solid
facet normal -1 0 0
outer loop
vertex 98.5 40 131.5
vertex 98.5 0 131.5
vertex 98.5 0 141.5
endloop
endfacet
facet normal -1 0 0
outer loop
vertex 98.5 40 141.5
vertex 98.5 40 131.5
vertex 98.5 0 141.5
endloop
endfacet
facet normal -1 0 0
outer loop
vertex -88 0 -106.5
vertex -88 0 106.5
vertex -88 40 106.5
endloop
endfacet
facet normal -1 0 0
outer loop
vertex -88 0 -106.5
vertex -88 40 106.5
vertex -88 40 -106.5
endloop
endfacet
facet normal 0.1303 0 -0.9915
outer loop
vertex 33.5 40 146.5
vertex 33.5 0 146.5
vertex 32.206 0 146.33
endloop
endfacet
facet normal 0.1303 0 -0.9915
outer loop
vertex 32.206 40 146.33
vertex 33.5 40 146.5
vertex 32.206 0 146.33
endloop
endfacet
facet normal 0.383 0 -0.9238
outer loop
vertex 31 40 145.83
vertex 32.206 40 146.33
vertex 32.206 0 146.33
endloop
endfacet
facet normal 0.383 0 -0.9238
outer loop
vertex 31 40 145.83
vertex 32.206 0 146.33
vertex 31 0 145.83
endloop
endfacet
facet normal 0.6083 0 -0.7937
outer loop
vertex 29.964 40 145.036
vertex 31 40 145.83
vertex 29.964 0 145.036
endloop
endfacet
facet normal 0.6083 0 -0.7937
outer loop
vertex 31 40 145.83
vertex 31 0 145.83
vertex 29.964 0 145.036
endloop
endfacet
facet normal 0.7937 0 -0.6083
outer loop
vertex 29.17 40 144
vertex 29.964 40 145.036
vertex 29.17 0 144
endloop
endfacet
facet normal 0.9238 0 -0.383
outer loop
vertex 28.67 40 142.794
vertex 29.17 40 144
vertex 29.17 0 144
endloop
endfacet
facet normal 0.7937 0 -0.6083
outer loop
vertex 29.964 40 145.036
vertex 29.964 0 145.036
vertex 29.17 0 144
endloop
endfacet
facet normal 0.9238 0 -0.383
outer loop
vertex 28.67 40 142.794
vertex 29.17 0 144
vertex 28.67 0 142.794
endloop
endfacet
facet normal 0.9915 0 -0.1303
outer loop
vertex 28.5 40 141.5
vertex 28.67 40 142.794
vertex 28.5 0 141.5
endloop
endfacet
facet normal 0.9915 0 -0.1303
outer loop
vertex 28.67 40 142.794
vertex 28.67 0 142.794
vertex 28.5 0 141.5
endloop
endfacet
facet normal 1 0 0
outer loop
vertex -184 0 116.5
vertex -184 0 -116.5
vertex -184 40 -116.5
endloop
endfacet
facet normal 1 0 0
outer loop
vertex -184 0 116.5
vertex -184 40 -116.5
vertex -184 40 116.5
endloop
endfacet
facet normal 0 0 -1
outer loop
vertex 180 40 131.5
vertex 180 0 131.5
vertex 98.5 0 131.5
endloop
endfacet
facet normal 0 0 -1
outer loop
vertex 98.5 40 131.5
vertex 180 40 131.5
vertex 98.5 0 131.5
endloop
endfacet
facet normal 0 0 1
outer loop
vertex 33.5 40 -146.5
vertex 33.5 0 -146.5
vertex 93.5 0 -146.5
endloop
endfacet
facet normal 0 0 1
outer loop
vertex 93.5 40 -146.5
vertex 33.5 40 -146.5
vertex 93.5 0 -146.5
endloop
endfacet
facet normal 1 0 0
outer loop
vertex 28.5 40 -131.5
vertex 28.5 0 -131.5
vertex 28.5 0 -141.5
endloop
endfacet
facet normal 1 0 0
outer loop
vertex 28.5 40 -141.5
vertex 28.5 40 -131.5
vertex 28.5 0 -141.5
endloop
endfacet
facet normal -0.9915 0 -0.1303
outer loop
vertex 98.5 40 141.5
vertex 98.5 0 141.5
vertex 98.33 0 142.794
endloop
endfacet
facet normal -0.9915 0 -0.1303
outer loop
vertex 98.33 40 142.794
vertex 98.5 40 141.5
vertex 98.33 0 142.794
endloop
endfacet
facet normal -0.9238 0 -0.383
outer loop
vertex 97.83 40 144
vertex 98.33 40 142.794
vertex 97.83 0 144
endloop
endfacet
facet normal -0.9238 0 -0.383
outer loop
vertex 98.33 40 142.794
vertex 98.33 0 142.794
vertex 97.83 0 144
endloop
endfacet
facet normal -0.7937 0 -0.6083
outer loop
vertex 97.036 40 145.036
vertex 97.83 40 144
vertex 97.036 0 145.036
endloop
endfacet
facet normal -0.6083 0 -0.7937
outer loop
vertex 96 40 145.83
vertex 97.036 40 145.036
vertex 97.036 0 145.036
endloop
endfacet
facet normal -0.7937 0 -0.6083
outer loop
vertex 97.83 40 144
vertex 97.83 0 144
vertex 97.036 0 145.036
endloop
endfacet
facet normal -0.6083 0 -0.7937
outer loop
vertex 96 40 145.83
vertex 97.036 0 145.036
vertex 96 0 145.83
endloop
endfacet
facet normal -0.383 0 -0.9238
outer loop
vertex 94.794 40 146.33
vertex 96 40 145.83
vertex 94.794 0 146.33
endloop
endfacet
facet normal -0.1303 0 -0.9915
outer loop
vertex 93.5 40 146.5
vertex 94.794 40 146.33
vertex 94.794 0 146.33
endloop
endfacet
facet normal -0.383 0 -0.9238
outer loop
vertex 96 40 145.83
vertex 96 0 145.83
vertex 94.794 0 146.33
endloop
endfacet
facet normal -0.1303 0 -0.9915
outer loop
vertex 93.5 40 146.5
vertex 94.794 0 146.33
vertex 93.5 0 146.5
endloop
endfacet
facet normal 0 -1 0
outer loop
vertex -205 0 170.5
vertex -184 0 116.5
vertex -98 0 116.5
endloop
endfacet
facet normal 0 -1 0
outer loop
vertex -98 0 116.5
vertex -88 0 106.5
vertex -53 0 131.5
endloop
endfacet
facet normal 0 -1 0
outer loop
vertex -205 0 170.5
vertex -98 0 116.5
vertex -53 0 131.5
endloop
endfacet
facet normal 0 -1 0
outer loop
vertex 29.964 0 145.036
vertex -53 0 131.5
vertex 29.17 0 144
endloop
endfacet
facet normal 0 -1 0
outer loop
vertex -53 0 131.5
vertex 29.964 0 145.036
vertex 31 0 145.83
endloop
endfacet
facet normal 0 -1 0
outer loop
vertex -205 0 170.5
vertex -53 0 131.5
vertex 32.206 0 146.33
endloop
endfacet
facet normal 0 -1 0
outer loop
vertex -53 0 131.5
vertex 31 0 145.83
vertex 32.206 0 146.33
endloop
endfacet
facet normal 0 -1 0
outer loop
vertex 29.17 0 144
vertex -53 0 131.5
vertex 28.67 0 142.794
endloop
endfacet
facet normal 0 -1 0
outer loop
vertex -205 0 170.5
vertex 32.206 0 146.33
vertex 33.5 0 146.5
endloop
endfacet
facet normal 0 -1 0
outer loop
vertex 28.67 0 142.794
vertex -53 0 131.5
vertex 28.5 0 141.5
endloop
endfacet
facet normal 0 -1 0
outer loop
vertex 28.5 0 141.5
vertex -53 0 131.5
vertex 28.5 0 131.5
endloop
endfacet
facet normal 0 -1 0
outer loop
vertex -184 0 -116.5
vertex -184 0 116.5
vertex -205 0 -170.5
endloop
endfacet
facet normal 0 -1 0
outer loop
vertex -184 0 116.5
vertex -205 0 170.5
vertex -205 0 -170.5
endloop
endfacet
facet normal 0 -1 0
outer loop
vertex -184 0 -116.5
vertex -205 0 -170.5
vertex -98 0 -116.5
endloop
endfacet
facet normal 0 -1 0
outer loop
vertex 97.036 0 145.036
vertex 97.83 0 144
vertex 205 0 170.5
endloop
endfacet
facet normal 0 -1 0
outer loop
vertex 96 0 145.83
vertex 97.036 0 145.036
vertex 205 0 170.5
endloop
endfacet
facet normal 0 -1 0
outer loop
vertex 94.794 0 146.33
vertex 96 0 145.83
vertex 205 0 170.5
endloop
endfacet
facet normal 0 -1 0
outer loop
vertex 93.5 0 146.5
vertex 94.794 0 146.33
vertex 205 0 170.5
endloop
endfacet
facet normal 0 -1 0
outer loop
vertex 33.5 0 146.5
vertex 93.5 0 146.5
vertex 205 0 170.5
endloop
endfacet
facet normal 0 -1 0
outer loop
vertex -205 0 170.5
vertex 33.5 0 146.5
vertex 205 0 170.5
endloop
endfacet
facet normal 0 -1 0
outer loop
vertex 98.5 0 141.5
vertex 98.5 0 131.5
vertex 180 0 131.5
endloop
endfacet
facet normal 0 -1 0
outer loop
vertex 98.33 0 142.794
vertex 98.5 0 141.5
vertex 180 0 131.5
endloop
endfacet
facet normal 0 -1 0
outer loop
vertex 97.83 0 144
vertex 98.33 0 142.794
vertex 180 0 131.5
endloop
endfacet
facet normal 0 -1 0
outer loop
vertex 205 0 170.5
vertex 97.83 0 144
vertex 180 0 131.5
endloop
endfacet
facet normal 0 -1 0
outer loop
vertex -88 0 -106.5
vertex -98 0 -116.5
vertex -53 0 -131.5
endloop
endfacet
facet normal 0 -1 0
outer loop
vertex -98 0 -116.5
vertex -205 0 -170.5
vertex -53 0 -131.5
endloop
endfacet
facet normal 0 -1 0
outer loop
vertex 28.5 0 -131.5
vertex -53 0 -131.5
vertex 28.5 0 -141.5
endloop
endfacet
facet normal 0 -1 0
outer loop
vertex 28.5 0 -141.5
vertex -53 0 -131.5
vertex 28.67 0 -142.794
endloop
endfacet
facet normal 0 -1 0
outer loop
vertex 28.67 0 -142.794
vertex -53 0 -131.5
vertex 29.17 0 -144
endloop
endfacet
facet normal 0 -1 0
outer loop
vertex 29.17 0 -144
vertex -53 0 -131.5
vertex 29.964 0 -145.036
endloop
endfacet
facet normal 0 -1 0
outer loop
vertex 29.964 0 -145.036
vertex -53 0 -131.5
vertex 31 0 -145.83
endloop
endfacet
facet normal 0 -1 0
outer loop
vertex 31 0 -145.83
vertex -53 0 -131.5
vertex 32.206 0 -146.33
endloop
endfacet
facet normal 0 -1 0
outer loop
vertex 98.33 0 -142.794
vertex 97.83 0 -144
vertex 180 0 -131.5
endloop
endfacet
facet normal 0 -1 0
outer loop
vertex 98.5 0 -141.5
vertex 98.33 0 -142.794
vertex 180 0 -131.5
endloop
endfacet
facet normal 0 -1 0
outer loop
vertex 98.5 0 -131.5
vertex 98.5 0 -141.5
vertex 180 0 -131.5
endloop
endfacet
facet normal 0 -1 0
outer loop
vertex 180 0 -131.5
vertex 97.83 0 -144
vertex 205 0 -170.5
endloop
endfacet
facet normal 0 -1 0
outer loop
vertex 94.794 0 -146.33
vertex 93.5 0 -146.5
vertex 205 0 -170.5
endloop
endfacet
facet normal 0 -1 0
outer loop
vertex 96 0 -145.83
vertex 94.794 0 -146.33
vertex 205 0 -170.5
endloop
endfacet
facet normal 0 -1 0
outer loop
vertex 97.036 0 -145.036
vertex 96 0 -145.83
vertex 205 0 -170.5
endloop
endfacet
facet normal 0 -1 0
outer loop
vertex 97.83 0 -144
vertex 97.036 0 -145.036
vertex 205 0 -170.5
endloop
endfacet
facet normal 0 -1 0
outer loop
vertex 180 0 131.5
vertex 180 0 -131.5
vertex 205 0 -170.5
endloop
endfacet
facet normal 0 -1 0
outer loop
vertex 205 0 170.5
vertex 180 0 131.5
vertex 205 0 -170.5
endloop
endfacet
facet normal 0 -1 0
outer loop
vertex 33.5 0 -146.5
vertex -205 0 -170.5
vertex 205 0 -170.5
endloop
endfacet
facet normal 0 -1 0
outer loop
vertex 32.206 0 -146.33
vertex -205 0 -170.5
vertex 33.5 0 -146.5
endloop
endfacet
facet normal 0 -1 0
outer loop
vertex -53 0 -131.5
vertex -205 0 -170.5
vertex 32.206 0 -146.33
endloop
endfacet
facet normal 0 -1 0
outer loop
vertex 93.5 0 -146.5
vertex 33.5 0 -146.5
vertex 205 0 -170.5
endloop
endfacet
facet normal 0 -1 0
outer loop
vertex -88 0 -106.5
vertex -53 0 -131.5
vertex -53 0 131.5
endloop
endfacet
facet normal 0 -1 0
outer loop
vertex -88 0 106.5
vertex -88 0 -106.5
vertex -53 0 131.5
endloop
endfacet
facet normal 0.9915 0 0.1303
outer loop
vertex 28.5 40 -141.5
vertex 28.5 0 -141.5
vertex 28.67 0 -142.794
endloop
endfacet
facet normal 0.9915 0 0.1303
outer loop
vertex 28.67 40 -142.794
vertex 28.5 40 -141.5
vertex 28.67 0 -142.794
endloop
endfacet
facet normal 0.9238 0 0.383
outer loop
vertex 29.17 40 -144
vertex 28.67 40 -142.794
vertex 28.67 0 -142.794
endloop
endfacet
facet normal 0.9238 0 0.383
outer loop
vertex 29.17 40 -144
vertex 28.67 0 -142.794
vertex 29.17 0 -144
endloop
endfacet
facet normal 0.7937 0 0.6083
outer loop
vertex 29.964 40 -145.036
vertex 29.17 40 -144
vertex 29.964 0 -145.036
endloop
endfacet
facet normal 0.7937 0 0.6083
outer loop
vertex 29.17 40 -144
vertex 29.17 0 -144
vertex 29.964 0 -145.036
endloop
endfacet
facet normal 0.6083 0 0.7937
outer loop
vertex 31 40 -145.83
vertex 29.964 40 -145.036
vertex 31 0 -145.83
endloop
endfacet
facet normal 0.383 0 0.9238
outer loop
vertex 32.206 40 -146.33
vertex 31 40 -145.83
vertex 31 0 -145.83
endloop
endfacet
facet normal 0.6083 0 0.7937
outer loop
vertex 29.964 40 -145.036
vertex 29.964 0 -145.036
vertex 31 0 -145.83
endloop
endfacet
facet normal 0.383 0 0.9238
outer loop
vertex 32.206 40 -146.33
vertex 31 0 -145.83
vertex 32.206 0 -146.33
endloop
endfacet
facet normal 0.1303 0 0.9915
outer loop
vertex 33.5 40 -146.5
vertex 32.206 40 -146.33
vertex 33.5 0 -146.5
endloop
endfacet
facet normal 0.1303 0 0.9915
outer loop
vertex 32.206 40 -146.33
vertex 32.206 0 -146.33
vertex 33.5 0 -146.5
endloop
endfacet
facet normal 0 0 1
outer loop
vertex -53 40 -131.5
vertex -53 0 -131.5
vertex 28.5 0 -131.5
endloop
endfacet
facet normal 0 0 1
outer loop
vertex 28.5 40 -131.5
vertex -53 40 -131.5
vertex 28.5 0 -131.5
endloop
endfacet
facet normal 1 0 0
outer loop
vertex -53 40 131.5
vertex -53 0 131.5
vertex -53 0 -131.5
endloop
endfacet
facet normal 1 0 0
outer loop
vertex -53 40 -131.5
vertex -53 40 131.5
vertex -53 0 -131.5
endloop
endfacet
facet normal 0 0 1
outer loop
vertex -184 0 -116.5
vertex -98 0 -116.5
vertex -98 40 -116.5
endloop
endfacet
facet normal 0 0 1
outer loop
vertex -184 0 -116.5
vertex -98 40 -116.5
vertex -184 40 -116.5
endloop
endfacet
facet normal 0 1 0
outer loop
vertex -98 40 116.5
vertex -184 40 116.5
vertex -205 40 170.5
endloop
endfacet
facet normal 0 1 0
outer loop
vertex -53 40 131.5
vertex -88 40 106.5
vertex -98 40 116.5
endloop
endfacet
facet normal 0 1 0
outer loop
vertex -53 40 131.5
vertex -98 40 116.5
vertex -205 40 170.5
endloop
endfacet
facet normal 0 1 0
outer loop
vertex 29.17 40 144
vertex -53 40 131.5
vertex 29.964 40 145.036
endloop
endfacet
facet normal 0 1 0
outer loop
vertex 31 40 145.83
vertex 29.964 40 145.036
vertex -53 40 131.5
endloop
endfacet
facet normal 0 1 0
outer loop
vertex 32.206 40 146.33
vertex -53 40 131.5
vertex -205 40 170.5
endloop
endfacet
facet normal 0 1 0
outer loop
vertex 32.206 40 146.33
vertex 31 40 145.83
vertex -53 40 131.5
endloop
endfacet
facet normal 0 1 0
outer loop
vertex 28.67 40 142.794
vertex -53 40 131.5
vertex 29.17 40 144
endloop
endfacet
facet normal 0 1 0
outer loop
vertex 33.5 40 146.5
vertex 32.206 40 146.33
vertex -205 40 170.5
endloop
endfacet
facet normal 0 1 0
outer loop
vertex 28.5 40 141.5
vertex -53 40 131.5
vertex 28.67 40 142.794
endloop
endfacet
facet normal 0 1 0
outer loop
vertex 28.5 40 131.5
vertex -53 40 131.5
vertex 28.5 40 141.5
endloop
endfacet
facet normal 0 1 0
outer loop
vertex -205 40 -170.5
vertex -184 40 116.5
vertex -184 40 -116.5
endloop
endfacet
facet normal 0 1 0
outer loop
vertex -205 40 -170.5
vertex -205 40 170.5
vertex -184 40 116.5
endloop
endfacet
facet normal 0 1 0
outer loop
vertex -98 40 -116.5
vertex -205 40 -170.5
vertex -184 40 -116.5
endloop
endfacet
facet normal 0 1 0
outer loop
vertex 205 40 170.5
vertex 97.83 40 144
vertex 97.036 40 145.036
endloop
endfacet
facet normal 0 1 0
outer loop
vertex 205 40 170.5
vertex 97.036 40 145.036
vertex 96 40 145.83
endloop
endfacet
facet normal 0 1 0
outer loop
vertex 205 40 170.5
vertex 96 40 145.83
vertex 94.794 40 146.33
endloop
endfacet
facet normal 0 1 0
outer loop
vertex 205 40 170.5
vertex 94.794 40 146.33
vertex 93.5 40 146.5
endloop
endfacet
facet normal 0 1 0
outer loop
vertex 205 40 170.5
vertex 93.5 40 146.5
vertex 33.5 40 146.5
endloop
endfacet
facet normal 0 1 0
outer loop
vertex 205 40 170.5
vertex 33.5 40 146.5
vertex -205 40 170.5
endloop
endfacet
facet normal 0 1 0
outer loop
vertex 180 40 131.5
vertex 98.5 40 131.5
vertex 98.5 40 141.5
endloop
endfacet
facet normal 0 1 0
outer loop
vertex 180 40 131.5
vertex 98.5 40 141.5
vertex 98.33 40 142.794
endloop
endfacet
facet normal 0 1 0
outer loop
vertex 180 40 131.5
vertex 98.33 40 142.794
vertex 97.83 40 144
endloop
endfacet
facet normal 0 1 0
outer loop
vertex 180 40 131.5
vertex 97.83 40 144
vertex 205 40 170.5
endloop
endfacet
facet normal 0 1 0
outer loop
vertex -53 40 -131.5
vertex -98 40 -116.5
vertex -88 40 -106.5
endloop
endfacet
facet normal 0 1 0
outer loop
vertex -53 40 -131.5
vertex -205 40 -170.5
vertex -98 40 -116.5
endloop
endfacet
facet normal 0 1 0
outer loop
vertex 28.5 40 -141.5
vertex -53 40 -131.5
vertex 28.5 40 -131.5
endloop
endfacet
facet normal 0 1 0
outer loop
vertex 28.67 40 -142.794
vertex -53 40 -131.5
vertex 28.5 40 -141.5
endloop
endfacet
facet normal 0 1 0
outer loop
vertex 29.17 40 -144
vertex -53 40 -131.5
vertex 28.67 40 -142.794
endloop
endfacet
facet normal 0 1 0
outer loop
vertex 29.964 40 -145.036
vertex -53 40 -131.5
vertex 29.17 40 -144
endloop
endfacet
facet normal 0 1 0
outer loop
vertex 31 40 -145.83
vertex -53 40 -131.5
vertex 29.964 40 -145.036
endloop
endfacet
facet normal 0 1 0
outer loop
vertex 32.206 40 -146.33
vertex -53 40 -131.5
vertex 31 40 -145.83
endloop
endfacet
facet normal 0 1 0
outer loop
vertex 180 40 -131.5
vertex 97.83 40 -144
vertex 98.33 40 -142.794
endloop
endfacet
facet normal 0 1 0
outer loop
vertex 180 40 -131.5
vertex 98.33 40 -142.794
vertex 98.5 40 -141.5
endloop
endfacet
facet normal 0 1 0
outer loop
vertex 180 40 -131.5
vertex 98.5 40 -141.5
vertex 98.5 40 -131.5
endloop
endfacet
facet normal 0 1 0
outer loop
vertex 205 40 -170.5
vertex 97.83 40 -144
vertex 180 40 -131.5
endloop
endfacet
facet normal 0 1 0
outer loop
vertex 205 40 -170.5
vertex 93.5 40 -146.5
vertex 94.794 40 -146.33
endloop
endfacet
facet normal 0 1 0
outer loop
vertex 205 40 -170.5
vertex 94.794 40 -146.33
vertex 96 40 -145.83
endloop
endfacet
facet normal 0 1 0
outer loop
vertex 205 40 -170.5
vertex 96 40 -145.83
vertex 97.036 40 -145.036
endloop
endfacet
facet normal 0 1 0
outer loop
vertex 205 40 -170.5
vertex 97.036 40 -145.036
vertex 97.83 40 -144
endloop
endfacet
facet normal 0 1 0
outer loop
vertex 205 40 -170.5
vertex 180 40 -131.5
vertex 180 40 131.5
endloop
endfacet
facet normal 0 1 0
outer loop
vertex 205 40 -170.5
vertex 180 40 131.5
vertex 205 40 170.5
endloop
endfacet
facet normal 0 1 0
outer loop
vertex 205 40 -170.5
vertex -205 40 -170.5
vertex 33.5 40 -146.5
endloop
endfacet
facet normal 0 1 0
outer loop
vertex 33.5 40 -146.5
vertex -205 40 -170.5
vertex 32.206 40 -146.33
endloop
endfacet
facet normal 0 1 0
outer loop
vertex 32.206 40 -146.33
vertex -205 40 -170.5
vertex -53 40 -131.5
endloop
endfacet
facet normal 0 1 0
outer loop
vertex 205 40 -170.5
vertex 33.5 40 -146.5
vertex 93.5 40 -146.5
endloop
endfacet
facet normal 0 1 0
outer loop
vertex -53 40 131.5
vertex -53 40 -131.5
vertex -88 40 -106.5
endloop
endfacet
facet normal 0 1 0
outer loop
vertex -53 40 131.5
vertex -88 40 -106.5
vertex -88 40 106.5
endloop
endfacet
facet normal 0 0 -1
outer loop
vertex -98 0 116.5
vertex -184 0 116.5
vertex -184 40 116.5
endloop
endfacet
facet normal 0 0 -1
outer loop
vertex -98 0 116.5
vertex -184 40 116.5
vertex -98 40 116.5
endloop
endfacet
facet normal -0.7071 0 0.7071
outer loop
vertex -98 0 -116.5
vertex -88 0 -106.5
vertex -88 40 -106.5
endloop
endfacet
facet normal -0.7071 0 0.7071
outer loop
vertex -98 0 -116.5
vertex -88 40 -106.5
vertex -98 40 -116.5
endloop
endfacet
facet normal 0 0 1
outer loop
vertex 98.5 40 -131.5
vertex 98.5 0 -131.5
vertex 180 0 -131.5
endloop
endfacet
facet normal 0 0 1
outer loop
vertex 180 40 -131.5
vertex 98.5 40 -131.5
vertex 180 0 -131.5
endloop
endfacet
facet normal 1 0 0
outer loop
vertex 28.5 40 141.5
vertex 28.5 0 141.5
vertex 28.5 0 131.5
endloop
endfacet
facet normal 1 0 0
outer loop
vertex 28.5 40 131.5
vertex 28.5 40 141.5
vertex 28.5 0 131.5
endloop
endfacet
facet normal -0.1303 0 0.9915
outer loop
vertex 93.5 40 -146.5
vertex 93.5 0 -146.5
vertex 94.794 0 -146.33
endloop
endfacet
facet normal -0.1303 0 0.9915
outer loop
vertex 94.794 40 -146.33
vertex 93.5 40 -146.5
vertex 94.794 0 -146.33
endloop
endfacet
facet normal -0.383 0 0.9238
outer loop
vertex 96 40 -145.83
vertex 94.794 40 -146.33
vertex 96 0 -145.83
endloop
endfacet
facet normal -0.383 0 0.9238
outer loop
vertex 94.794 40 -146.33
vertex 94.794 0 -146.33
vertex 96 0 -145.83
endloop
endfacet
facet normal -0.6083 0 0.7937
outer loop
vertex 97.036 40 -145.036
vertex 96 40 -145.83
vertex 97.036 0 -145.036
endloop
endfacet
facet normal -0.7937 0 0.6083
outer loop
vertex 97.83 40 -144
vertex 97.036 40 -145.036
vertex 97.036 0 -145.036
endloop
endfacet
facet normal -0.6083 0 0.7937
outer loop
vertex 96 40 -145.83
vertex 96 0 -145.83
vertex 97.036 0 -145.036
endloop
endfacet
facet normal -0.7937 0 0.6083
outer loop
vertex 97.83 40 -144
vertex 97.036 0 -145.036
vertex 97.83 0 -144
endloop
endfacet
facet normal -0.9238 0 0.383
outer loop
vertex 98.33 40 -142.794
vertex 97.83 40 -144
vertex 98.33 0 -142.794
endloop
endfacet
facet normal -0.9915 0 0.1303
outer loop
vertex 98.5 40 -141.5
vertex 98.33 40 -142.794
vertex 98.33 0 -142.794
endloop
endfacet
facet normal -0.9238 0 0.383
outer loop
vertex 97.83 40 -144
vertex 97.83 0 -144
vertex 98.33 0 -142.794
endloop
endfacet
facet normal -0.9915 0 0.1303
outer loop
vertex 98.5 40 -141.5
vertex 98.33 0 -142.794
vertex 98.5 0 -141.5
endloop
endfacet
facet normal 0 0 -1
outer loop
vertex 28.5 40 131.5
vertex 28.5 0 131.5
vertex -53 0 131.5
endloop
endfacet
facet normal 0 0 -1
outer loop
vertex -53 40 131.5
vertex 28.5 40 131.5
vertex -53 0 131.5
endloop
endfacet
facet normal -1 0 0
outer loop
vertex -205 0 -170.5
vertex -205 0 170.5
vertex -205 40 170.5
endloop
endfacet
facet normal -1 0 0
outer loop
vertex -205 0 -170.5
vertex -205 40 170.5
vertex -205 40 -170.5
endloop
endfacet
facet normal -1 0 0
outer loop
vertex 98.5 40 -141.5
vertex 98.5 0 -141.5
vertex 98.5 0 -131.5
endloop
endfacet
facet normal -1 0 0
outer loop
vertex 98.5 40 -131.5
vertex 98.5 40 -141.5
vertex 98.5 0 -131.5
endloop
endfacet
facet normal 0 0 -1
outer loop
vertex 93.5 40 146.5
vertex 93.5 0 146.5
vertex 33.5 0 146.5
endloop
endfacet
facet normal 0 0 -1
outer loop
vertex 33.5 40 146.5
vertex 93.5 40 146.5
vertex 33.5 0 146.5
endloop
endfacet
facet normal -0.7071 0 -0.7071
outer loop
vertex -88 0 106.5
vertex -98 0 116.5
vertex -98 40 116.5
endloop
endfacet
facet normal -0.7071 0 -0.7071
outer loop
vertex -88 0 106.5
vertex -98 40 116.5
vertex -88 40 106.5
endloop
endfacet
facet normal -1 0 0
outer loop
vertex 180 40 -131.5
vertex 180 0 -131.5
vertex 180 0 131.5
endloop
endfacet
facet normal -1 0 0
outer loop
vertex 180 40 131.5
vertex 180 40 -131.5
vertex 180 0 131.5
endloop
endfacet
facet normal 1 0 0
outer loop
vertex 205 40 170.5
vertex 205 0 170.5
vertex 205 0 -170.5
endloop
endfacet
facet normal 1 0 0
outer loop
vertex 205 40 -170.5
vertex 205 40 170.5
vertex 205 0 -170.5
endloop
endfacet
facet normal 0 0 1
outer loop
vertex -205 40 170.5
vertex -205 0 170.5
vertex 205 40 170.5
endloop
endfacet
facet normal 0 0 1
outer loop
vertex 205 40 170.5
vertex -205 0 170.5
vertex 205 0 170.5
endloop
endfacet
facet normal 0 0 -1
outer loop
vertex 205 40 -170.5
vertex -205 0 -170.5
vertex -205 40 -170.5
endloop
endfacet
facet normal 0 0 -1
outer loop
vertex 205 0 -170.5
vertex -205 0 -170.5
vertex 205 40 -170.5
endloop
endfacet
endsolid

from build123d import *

# Parameters (mm, degrees)
SKETCH1_W           = 410
SKETCH1_H           = 341
BOSS_EXTRUDE1_DEPTH = 40


with BuildPart() as part:
    # Sketch1 → Boss-Extrude1 (new body)
    with BuildSketch(Plane(origin=(0, 0, 0), x_dir=(1, 0, 0), z_dir=(0, 1, 0))):
        Rectangle(SKETCH1_W, SKETCH1_H)
        with BuildLine():
            Line((28.5, 131.5), (28.5, 141.5))
            ThreePointArc((28.5, 141.5), (29.964466094, 145.035533906), (33.5, 146.5))
            Line((33.5, 146.5), (93.5, 146.5))
            ThreePointArc((93.5, 146.5), (97.035533906, 145.035533906), (98.5, 141.5))
            Line((98.5, 141.5), (98.5, 131.5))
            Line((98.5, 131.5), (180, 131.5))
            Line((180, 131.5), (180, -131.5))
            Line((180, -131.5), (98.5, -131.5))
            Line((98.5, -131.5), (98.5, -141.5))
            ThreePointArc((98.5, -141.5), (97.035533906, -145.035533906), (93.5, -146.5))
            Line((93.5, -146.5), (33.5, -146.5))
            ThreePointArc((33.5, -146.5), (29.964466094, -145.035533906), (28.5, -141.5))
            Line((28.5, -141.5), (28.5, -131.5))
            Line((28.5, -131.5), (-53, -131.5))
            Line((-53, -131.5), (-53, 131.5))
            Line((-53, 131.5), (28.5, 131.5))
        make_face(mode=Mode.SUBTRACT)
        Polygon((-184, -116.5), (-98, -116.5), (-88, -106.5), (-88, 106.5), (-98, 116.5), (-184, 116.5), align=None, mode=Mode.SUBTRACT)
    extrude(amount=BOSS_EXTRUDE1_DEPTH)


solid = part.part
